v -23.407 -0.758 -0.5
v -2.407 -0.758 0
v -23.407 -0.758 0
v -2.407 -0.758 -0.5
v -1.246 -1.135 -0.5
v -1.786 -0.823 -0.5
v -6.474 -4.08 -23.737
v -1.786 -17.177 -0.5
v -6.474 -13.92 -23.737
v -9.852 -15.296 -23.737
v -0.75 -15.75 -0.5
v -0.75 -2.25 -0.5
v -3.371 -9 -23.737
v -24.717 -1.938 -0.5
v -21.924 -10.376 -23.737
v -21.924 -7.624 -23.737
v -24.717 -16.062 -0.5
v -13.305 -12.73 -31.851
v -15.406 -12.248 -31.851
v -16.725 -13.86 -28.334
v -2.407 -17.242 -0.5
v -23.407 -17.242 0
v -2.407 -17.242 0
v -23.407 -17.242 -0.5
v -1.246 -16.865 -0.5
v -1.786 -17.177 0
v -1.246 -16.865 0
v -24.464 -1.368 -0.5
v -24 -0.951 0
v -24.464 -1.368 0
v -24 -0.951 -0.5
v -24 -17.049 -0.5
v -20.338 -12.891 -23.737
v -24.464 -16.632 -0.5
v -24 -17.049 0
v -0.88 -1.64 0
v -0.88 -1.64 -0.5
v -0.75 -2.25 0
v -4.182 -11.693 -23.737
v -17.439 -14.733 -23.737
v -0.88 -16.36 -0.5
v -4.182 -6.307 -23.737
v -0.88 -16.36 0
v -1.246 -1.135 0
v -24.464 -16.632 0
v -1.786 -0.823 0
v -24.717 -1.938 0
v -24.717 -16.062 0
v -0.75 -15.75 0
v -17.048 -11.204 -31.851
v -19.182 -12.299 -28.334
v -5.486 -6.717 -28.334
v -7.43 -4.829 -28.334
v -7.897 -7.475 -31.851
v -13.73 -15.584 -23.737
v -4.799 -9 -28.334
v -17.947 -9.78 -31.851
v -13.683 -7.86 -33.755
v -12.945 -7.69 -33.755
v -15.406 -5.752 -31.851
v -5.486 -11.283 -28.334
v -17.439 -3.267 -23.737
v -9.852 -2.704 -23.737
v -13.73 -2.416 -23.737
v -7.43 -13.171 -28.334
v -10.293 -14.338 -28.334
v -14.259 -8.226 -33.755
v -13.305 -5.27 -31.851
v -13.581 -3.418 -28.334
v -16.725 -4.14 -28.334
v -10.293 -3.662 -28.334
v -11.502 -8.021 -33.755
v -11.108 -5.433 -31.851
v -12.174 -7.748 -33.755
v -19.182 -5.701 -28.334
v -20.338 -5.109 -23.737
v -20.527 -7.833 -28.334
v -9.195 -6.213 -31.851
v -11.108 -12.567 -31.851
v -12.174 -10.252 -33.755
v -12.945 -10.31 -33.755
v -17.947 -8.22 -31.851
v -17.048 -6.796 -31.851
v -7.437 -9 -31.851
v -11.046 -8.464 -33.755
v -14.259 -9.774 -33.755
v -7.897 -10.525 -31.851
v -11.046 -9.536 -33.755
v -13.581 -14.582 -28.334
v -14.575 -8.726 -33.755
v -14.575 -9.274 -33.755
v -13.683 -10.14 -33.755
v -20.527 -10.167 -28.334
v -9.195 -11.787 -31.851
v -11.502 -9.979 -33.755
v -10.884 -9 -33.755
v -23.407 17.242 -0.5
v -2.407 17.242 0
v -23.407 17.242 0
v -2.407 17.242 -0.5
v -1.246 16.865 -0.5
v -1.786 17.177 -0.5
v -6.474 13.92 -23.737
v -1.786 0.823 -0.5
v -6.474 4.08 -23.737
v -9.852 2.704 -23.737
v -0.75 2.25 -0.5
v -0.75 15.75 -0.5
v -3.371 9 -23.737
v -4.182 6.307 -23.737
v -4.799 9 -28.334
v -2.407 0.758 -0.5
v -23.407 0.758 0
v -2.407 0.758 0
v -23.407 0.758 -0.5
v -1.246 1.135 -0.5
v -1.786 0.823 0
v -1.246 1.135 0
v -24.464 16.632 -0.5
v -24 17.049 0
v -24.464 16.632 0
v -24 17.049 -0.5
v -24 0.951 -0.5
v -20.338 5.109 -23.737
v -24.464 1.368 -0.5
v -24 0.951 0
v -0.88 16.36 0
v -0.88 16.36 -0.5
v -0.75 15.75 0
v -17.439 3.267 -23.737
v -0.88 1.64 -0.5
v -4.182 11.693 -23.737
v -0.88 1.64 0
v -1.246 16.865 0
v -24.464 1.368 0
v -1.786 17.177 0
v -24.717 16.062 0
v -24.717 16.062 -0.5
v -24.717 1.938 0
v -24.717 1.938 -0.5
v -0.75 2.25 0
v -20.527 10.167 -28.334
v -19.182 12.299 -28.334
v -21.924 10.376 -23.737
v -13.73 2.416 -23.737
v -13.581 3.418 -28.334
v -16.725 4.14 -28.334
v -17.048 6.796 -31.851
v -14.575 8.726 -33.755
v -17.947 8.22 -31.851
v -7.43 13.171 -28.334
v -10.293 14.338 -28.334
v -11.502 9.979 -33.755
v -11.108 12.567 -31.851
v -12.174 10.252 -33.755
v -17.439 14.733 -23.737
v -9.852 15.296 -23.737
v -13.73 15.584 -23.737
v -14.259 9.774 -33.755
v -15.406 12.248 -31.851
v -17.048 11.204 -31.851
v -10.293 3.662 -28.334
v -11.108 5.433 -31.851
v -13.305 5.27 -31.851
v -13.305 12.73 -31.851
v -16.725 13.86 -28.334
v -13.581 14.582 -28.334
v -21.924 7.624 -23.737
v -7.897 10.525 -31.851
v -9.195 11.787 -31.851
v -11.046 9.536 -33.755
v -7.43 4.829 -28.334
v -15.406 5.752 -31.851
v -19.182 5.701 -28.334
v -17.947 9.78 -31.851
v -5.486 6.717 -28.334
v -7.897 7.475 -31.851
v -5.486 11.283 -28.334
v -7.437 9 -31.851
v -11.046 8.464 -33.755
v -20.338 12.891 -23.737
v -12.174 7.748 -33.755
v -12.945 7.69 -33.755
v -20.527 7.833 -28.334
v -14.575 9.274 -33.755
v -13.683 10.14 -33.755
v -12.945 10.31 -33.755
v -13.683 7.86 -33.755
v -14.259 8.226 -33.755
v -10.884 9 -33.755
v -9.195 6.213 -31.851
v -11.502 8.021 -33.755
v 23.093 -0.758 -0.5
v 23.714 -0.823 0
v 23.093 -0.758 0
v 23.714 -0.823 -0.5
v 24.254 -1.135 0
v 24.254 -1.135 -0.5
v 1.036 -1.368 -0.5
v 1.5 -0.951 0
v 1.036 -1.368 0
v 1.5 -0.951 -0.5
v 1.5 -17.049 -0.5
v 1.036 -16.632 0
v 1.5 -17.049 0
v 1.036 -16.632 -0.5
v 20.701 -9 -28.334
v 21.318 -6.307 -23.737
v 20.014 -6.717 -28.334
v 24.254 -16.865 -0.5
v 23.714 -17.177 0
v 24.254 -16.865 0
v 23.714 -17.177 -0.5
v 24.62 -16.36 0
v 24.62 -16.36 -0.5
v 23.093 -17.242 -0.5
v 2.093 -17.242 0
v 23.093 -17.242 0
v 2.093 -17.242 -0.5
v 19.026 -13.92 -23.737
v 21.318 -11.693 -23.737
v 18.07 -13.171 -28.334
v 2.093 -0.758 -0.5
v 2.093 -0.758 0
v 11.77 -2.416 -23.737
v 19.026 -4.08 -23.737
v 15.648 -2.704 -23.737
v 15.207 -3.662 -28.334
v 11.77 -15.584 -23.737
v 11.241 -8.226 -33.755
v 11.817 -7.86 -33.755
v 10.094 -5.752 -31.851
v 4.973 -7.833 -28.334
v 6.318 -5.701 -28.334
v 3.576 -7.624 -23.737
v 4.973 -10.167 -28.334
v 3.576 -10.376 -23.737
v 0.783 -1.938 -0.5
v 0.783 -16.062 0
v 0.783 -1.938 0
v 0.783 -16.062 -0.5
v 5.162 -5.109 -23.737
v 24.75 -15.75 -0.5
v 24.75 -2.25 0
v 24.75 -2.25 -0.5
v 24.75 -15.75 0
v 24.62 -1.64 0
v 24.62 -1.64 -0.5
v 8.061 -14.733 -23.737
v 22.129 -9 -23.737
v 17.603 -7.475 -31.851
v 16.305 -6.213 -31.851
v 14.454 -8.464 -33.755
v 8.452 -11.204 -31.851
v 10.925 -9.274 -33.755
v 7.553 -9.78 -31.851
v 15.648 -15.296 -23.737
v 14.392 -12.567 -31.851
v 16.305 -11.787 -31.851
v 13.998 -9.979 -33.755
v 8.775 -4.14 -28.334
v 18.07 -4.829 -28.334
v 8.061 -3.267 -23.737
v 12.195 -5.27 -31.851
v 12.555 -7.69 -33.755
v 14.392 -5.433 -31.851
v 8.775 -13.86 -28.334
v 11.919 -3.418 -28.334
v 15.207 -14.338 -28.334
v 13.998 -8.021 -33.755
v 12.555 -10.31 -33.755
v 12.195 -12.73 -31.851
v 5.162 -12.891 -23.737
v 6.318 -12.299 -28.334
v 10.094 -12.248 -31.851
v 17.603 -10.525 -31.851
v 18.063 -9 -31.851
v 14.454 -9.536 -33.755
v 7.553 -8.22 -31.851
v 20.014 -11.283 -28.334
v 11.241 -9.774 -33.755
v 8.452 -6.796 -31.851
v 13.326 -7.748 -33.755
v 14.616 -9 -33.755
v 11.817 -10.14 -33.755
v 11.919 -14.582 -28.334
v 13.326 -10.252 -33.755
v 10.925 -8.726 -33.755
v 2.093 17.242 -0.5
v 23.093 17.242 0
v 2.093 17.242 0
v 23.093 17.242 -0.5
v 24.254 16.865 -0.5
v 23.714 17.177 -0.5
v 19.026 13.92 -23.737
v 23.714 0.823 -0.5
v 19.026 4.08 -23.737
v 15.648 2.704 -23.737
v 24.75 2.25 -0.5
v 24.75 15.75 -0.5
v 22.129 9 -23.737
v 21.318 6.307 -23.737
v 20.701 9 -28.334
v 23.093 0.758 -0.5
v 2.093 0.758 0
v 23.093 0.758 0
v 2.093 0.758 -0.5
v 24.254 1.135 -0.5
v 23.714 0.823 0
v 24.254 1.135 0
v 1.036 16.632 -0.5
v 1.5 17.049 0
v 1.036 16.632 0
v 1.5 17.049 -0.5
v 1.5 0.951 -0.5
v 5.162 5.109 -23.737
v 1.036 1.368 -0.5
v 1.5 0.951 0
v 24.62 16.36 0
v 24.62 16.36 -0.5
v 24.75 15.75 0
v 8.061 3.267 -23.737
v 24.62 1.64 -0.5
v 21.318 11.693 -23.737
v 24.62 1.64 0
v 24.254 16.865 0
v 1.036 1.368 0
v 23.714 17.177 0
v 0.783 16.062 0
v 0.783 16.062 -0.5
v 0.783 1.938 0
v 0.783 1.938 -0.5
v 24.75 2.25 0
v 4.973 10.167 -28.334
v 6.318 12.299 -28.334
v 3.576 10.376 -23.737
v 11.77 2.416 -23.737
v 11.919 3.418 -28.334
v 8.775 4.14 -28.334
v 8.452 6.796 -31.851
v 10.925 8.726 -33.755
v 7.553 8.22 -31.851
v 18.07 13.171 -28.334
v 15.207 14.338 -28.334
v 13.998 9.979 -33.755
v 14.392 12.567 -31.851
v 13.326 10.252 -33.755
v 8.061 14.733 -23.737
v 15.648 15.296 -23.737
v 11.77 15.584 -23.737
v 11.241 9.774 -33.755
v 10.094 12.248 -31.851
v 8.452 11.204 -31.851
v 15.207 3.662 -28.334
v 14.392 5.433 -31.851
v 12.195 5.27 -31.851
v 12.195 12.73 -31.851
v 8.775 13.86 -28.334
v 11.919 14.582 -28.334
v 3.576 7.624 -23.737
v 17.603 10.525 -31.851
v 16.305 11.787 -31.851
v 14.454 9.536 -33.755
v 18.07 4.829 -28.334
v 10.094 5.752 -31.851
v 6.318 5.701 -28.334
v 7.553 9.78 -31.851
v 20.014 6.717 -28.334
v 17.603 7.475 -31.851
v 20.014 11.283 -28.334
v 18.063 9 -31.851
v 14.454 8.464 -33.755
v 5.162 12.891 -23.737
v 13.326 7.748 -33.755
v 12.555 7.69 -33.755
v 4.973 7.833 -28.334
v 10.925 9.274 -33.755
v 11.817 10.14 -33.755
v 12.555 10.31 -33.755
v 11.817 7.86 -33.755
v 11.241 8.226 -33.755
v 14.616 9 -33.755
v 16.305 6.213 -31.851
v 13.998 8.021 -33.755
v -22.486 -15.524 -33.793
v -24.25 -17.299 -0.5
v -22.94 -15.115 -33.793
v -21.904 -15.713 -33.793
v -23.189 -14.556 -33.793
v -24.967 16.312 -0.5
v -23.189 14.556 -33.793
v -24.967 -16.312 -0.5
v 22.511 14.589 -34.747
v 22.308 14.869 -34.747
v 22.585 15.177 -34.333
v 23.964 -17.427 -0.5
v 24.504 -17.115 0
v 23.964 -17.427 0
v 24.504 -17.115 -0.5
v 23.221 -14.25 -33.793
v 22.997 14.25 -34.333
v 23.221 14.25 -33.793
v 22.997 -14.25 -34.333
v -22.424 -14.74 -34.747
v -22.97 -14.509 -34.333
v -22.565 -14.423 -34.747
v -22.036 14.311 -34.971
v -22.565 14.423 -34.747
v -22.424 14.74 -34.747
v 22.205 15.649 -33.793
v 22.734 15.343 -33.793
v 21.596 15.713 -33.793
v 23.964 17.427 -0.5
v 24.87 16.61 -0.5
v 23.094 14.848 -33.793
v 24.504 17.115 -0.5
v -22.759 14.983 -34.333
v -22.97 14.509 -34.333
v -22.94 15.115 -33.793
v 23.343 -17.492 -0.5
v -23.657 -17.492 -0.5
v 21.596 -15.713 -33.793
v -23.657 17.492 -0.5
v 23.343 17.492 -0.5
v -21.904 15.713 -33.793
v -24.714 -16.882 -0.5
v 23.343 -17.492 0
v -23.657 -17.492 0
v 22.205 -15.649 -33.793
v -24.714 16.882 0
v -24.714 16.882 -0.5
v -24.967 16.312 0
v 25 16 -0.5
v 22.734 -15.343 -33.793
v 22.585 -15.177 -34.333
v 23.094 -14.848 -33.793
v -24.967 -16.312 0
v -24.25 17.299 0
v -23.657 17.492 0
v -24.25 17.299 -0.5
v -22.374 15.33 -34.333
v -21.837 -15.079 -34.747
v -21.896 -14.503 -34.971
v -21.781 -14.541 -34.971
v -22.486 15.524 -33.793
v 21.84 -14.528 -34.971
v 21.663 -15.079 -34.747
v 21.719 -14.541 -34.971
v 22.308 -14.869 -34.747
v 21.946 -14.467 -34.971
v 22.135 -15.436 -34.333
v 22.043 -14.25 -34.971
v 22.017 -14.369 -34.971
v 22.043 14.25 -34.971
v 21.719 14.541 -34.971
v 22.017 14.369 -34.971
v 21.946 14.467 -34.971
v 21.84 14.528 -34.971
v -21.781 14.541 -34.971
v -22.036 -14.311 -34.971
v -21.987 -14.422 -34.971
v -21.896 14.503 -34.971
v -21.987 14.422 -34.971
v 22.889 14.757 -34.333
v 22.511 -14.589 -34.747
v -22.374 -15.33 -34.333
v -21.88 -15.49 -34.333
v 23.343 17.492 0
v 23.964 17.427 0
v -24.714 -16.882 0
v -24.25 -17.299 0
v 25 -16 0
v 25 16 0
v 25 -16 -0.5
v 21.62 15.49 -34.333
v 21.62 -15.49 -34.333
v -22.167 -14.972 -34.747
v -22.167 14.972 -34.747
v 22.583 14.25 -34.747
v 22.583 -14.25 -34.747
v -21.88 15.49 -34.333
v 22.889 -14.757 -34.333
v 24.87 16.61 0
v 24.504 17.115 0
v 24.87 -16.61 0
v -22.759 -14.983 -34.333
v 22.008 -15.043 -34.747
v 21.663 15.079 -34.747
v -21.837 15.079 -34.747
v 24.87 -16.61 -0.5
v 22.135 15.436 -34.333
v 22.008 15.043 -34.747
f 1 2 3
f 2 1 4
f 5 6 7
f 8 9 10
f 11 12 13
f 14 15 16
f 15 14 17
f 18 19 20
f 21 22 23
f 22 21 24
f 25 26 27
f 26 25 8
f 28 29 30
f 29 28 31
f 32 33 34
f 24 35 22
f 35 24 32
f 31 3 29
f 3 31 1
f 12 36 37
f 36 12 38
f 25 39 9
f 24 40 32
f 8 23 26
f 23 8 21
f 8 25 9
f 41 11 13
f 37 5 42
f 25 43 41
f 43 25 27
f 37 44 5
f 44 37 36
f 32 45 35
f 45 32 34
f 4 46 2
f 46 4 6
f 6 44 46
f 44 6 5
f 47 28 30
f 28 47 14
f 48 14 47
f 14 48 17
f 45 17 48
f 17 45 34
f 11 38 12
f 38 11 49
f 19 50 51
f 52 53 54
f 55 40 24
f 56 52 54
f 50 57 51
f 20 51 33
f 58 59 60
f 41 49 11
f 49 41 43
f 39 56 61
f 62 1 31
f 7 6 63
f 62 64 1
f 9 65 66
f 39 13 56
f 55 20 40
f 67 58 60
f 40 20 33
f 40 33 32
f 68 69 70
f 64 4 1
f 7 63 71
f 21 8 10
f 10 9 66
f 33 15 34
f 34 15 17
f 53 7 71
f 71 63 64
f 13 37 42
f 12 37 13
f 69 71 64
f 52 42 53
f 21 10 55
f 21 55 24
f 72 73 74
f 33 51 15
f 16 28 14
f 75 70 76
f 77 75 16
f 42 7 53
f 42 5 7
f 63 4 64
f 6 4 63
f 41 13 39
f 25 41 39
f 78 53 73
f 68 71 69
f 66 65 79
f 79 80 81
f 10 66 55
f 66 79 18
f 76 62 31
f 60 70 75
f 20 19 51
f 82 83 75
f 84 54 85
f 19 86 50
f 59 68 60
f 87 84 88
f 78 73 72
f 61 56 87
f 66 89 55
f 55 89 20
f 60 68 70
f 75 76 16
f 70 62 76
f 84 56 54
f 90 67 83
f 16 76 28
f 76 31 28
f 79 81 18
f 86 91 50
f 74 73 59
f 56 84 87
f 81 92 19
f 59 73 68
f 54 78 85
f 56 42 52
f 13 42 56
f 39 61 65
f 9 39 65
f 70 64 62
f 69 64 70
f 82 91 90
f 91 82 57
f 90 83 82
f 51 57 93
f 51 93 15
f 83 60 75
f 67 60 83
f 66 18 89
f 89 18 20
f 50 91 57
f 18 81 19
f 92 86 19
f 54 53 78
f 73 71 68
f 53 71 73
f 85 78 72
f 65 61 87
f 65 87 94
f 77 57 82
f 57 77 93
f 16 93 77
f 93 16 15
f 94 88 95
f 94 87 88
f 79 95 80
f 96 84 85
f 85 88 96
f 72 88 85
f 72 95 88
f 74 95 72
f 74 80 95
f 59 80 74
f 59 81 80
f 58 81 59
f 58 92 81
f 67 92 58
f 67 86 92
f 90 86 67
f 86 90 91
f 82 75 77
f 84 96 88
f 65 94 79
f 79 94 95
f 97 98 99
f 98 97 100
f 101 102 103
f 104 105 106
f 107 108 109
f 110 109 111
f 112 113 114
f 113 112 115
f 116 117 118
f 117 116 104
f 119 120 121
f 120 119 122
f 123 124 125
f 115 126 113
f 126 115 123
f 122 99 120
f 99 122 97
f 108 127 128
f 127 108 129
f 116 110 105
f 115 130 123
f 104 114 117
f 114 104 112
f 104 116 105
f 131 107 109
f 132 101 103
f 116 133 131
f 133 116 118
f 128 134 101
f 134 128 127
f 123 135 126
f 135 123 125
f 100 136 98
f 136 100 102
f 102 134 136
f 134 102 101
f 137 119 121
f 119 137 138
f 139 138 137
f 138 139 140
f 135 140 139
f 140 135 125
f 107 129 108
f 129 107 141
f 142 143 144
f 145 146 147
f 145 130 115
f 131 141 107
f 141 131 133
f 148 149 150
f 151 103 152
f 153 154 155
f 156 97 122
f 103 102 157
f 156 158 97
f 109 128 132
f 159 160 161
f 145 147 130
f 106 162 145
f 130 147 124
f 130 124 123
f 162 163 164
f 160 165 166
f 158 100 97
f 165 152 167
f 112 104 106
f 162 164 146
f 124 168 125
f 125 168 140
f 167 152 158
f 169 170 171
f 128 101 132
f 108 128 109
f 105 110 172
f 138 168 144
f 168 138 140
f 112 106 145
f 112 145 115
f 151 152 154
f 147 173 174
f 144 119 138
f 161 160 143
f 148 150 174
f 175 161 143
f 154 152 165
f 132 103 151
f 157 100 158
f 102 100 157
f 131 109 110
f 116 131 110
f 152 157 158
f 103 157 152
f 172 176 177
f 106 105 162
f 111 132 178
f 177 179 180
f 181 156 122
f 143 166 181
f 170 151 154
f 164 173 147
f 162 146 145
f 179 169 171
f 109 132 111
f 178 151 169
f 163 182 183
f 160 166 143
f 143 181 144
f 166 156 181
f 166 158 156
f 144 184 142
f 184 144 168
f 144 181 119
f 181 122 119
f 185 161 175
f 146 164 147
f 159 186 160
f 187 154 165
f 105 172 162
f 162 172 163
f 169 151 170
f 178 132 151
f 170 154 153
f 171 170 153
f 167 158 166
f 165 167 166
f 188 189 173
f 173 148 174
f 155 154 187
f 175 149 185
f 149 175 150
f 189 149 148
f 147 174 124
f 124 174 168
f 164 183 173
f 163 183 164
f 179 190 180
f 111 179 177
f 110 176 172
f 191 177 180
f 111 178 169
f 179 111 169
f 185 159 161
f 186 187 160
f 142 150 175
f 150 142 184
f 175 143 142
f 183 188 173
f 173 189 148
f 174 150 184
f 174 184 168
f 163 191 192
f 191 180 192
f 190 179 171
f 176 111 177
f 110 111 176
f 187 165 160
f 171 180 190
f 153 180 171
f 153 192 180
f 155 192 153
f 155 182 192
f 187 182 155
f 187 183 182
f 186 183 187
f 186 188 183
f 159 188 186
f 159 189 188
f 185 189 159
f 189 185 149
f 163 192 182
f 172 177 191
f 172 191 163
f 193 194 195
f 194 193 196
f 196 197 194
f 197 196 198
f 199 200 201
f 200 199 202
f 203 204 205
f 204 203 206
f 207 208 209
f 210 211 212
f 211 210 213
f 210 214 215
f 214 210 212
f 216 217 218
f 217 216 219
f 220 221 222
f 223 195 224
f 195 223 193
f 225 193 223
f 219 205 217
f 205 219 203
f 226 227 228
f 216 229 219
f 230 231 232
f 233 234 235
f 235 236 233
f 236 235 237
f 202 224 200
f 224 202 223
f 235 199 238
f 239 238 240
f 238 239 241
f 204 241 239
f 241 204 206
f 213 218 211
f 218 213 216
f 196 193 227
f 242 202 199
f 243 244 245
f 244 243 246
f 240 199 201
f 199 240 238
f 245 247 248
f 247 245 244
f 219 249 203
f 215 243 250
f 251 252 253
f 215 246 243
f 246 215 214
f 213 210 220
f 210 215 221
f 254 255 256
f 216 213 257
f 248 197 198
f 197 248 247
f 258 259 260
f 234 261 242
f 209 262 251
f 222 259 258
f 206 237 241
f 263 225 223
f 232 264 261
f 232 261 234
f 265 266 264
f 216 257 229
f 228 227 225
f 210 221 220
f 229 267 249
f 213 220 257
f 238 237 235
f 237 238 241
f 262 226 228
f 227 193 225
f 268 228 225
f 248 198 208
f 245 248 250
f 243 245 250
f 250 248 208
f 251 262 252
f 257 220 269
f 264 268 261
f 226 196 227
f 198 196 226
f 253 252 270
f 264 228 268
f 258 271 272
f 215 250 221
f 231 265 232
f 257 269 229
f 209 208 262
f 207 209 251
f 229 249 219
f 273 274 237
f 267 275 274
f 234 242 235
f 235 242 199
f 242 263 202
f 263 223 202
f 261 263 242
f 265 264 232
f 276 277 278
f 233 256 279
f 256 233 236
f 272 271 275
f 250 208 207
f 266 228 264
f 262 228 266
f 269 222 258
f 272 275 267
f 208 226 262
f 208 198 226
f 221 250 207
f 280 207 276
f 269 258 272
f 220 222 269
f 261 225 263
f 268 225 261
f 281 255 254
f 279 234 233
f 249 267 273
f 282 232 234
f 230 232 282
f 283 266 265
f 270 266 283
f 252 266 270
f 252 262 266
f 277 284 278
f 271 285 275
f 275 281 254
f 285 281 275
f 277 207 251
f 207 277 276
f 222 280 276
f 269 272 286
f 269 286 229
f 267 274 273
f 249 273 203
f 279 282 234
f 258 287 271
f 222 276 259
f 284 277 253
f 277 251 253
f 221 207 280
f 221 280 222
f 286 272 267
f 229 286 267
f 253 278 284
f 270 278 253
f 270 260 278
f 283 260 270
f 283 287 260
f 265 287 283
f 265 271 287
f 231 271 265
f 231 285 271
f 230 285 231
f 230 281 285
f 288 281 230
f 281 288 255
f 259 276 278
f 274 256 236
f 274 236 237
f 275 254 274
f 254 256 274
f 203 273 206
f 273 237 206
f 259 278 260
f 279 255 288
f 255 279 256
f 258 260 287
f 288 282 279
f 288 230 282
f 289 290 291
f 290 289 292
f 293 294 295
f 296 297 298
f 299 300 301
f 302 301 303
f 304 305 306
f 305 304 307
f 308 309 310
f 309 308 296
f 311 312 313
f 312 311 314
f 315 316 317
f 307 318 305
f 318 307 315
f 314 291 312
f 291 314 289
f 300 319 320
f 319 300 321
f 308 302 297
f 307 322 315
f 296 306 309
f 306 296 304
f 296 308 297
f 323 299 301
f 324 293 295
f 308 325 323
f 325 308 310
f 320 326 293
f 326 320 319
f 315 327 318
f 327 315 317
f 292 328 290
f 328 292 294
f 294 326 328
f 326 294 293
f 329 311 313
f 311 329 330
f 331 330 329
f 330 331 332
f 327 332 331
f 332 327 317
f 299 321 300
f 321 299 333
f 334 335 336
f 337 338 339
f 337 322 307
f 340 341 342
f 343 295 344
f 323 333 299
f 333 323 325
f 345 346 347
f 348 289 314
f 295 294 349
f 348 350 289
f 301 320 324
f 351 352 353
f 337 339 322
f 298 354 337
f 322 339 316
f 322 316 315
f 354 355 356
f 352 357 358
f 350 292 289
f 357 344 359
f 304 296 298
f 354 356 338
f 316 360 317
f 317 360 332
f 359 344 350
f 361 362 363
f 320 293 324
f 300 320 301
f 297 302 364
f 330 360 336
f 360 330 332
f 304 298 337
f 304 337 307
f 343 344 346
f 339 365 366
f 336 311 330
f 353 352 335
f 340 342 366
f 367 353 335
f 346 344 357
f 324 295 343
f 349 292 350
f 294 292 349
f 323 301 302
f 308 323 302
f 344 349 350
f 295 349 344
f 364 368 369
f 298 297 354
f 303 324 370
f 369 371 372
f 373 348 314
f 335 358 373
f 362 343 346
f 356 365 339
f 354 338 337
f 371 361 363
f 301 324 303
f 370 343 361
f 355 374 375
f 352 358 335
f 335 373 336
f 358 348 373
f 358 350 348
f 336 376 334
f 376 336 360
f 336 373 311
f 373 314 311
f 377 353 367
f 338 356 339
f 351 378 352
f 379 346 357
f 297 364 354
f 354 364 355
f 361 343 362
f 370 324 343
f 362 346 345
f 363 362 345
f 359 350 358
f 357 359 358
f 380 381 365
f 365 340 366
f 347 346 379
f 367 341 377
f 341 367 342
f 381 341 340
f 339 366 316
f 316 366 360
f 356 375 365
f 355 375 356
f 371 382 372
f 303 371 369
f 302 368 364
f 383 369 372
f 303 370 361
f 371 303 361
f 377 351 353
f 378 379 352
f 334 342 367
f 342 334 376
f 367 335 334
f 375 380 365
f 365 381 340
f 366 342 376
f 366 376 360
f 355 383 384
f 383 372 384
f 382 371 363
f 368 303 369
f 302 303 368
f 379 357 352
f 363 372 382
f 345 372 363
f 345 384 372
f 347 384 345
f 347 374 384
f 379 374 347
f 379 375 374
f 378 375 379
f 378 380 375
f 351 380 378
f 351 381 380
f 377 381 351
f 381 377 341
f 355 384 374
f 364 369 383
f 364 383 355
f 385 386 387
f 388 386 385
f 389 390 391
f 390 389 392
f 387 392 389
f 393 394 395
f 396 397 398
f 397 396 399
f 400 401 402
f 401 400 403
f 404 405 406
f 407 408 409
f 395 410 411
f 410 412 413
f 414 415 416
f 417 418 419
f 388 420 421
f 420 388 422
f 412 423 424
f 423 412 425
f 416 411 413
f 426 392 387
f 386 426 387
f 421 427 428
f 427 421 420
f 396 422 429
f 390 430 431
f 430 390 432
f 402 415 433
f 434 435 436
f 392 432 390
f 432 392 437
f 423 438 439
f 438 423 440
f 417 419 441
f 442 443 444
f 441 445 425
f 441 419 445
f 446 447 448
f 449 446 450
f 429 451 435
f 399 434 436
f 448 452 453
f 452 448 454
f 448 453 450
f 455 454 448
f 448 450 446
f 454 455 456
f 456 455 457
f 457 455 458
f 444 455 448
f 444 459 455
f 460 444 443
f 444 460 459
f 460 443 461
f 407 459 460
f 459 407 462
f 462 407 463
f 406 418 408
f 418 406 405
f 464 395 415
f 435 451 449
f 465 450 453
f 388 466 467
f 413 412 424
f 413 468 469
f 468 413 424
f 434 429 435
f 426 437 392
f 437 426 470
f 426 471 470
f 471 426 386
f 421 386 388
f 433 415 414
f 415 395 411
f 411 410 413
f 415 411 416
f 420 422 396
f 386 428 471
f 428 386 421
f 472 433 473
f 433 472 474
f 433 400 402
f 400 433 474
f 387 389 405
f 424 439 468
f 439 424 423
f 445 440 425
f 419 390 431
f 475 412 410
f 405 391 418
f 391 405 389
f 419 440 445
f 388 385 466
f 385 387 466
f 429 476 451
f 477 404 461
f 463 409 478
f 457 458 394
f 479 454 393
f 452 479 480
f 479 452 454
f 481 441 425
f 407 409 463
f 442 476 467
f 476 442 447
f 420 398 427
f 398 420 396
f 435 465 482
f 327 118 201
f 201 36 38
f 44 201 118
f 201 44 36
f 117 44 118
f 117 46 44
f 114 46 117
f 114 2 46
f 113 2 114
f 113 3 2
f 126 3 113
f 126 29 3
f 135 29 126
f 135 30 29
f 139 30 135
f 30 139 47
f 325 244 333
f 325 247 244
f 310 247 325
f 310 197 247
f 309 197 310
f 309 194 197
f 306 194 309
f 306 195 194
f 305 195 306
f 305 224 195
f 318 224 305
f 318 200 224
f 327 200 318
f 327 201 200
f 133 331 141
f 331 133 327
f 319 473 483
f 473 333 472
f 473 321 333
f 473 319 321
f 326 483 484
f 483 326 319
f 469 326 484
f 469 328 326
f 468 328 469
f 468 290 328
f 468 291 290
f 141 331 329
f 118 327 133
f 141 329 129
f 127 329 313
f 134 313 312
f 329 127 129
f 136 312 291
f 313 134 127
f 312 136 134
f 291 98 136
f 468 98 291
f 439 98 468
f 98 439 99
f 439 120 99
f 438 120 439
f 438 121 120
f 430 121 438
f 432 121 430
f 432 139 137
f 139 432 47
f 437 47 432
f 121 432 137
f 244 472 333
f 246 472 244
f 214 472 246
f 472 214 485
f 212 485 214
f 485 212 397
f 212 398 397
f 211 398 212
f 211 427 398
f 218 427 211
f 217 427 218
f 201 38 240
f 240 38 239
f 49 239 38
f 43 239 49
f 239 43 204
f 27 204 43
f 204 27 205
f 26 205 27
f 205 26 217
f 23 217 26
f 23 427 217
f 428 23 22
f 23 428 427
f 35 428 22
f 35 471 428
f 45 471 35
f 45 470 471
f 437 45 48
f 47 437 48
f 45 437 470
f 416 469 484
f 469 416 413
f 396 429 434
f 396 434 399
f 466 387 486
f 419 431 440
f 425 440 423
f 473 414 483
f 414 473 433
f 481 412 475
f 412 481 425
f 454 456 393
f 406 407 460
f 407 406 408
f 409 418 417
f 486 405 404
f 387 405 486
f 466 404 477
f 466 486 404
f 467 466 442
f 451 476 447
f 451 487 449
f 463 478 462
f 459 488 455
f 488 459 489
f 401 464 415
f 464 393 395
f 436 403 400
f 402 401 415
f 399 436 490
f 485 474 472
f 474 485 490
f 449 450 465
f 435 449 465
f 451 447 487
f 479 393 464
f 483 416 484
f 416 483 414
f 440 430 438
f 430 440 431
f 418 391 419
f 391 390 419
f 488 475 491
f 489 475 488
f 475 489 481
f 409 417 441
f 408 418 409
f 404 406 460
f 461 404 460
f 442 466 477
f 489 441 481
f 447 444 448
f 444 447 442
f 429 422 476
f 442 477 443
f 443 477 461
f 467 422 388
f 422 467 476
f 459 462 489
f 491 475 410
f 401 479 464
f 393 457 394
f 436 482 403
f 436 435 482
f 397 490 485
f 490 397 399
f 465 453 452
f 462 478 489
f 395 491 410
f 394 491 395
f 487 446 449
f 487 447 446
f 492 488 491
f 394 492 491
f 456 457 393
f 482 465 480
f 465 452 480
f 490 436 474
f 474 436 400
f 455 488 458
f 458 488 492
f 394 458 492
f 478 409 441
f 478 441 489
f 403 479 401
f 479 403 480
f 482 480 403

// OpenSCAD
$fn=15;
//outside dimenstions

//depth=38; //constant for all sizes
//using shorter height to clear registration tabs
depth=35; //constant for all sizes

//"Small Bin" (internal dimensions)
width=50; //x-axis
height=35; //y-axis

//wallThickness (set to match your slicer settings)
wall=.5; //.4 is typical

//#of 'shells' or 'perimeters'
inner_shells=3; //This multiplid by 'wall' is the total thickness of internal walls
outer_shells=1; //the width of outer walls

//depth of the 'floor' (distance between the bottom of the well and the bottom of the model
//setting this to a larger number makes a shallower well, a negative number leaves a hole in the bottom
floor=1;

//radius of 'interior' corners
corner=1.5;

//Number of cavities
cols=2; //x axis (width)
rows=2; //y axis (height)

//chamfer of outer edges (radius of the corners)
chamfer=1.5;

//draft angle of the inside of the box (degrees) Adjust if insert doesn't sit snugly in bin
draft=1.75;

//shape of the bottom of the well (a sphere is scaled to these proportions. Largest effect will be seen by reducing zwell to flatten the bottom out
xWell=.75;
yWell=.75;
zWell=.75;

//find the offset from top/bottom based on the draft angle.
function draft_off(d=draft) = height/(1/tan(d));

//we will model the bulk centered around the origin, so calculate centerline of sphere used for outer 'hull()' operation
xoff=.5*width-chamfer;
yoff=.5*height-chamfer;

//The main body that will have cavities difference()-ed out of it
module bulk() {
    hull() {
        for(x = [-1,1]) {
            for(y = [-1,1]) {
                //for each quadrant
                for(z = [0,1]) {
                    //and top/bottom
                    translate([xoff*x-draft*z*x,yoff*y-draft*z*y, chamfer*z-depth*z]) {
                        if(z == 0) { //top is done with shallow circles so it is flat
                            translate([0,0,-.5]) linear_extrude(.5) circle(r=chamfer);
                        } else {
                            sphere(r=chamfer);
                        }
                    }
                }
            }
        }
    }
}

//helper to do some math
function min_max(n) = (n <= 1 ? 0 : (n-1) / 2);

//distance between centers of cavities (if more than 1)
row_size = (height-wall*outer_shells)/rows + (min_max(rows) == 0 ? 1: min_max(rows))*wall*inner_shells; //y-axis
col_size = (width-wall*outer_shells)/cols + (min_max(cols) == 0 ? 1: min_max(cols))*wall*inner_shells; //x-axis

module cavities() {
    row_minmax = min_max(rows);
    col_minmax = min_max(cols);

    for (x = [col_minmax*-1:1:col_minmax]) {
        for( y = [row_minmax*-1:1:row_minmax]) {
            translate([x*col_size,y*row_size]) {
                cavity();
            }
        }
    }
}

module cavity() {
    hull() {
        for (x = [-1,1]) { for (y = [-1,1]) {
            translate([(.5*(col_size-wall*inner_shells)-corner)*x,(.5*(row_size-wall*inner_shells)-corner)*y, 0]) {
                translate([0,0,-.5]) linear_extrude(.6) circle(r=corner);
        } } }
        translate([0,0,-1*(depth-floor)+(depth-floor)*zWell*.5]) scale([col_size*yWell, row_size*xWell, (depth-floor)*zWell])#sphere(d=1);
    }
}

module box() {
    difference() {
        bulk();
        cavities();
    }
}

box();

//see a cross-section
//intersection() {
//box();
//translate([0,-.5*row_size,-100])cube([500,500,500]);
//}

//reference cube for size comparison
//translate([0,0,depth*.6]) cube([width, height, depth], center=true);
